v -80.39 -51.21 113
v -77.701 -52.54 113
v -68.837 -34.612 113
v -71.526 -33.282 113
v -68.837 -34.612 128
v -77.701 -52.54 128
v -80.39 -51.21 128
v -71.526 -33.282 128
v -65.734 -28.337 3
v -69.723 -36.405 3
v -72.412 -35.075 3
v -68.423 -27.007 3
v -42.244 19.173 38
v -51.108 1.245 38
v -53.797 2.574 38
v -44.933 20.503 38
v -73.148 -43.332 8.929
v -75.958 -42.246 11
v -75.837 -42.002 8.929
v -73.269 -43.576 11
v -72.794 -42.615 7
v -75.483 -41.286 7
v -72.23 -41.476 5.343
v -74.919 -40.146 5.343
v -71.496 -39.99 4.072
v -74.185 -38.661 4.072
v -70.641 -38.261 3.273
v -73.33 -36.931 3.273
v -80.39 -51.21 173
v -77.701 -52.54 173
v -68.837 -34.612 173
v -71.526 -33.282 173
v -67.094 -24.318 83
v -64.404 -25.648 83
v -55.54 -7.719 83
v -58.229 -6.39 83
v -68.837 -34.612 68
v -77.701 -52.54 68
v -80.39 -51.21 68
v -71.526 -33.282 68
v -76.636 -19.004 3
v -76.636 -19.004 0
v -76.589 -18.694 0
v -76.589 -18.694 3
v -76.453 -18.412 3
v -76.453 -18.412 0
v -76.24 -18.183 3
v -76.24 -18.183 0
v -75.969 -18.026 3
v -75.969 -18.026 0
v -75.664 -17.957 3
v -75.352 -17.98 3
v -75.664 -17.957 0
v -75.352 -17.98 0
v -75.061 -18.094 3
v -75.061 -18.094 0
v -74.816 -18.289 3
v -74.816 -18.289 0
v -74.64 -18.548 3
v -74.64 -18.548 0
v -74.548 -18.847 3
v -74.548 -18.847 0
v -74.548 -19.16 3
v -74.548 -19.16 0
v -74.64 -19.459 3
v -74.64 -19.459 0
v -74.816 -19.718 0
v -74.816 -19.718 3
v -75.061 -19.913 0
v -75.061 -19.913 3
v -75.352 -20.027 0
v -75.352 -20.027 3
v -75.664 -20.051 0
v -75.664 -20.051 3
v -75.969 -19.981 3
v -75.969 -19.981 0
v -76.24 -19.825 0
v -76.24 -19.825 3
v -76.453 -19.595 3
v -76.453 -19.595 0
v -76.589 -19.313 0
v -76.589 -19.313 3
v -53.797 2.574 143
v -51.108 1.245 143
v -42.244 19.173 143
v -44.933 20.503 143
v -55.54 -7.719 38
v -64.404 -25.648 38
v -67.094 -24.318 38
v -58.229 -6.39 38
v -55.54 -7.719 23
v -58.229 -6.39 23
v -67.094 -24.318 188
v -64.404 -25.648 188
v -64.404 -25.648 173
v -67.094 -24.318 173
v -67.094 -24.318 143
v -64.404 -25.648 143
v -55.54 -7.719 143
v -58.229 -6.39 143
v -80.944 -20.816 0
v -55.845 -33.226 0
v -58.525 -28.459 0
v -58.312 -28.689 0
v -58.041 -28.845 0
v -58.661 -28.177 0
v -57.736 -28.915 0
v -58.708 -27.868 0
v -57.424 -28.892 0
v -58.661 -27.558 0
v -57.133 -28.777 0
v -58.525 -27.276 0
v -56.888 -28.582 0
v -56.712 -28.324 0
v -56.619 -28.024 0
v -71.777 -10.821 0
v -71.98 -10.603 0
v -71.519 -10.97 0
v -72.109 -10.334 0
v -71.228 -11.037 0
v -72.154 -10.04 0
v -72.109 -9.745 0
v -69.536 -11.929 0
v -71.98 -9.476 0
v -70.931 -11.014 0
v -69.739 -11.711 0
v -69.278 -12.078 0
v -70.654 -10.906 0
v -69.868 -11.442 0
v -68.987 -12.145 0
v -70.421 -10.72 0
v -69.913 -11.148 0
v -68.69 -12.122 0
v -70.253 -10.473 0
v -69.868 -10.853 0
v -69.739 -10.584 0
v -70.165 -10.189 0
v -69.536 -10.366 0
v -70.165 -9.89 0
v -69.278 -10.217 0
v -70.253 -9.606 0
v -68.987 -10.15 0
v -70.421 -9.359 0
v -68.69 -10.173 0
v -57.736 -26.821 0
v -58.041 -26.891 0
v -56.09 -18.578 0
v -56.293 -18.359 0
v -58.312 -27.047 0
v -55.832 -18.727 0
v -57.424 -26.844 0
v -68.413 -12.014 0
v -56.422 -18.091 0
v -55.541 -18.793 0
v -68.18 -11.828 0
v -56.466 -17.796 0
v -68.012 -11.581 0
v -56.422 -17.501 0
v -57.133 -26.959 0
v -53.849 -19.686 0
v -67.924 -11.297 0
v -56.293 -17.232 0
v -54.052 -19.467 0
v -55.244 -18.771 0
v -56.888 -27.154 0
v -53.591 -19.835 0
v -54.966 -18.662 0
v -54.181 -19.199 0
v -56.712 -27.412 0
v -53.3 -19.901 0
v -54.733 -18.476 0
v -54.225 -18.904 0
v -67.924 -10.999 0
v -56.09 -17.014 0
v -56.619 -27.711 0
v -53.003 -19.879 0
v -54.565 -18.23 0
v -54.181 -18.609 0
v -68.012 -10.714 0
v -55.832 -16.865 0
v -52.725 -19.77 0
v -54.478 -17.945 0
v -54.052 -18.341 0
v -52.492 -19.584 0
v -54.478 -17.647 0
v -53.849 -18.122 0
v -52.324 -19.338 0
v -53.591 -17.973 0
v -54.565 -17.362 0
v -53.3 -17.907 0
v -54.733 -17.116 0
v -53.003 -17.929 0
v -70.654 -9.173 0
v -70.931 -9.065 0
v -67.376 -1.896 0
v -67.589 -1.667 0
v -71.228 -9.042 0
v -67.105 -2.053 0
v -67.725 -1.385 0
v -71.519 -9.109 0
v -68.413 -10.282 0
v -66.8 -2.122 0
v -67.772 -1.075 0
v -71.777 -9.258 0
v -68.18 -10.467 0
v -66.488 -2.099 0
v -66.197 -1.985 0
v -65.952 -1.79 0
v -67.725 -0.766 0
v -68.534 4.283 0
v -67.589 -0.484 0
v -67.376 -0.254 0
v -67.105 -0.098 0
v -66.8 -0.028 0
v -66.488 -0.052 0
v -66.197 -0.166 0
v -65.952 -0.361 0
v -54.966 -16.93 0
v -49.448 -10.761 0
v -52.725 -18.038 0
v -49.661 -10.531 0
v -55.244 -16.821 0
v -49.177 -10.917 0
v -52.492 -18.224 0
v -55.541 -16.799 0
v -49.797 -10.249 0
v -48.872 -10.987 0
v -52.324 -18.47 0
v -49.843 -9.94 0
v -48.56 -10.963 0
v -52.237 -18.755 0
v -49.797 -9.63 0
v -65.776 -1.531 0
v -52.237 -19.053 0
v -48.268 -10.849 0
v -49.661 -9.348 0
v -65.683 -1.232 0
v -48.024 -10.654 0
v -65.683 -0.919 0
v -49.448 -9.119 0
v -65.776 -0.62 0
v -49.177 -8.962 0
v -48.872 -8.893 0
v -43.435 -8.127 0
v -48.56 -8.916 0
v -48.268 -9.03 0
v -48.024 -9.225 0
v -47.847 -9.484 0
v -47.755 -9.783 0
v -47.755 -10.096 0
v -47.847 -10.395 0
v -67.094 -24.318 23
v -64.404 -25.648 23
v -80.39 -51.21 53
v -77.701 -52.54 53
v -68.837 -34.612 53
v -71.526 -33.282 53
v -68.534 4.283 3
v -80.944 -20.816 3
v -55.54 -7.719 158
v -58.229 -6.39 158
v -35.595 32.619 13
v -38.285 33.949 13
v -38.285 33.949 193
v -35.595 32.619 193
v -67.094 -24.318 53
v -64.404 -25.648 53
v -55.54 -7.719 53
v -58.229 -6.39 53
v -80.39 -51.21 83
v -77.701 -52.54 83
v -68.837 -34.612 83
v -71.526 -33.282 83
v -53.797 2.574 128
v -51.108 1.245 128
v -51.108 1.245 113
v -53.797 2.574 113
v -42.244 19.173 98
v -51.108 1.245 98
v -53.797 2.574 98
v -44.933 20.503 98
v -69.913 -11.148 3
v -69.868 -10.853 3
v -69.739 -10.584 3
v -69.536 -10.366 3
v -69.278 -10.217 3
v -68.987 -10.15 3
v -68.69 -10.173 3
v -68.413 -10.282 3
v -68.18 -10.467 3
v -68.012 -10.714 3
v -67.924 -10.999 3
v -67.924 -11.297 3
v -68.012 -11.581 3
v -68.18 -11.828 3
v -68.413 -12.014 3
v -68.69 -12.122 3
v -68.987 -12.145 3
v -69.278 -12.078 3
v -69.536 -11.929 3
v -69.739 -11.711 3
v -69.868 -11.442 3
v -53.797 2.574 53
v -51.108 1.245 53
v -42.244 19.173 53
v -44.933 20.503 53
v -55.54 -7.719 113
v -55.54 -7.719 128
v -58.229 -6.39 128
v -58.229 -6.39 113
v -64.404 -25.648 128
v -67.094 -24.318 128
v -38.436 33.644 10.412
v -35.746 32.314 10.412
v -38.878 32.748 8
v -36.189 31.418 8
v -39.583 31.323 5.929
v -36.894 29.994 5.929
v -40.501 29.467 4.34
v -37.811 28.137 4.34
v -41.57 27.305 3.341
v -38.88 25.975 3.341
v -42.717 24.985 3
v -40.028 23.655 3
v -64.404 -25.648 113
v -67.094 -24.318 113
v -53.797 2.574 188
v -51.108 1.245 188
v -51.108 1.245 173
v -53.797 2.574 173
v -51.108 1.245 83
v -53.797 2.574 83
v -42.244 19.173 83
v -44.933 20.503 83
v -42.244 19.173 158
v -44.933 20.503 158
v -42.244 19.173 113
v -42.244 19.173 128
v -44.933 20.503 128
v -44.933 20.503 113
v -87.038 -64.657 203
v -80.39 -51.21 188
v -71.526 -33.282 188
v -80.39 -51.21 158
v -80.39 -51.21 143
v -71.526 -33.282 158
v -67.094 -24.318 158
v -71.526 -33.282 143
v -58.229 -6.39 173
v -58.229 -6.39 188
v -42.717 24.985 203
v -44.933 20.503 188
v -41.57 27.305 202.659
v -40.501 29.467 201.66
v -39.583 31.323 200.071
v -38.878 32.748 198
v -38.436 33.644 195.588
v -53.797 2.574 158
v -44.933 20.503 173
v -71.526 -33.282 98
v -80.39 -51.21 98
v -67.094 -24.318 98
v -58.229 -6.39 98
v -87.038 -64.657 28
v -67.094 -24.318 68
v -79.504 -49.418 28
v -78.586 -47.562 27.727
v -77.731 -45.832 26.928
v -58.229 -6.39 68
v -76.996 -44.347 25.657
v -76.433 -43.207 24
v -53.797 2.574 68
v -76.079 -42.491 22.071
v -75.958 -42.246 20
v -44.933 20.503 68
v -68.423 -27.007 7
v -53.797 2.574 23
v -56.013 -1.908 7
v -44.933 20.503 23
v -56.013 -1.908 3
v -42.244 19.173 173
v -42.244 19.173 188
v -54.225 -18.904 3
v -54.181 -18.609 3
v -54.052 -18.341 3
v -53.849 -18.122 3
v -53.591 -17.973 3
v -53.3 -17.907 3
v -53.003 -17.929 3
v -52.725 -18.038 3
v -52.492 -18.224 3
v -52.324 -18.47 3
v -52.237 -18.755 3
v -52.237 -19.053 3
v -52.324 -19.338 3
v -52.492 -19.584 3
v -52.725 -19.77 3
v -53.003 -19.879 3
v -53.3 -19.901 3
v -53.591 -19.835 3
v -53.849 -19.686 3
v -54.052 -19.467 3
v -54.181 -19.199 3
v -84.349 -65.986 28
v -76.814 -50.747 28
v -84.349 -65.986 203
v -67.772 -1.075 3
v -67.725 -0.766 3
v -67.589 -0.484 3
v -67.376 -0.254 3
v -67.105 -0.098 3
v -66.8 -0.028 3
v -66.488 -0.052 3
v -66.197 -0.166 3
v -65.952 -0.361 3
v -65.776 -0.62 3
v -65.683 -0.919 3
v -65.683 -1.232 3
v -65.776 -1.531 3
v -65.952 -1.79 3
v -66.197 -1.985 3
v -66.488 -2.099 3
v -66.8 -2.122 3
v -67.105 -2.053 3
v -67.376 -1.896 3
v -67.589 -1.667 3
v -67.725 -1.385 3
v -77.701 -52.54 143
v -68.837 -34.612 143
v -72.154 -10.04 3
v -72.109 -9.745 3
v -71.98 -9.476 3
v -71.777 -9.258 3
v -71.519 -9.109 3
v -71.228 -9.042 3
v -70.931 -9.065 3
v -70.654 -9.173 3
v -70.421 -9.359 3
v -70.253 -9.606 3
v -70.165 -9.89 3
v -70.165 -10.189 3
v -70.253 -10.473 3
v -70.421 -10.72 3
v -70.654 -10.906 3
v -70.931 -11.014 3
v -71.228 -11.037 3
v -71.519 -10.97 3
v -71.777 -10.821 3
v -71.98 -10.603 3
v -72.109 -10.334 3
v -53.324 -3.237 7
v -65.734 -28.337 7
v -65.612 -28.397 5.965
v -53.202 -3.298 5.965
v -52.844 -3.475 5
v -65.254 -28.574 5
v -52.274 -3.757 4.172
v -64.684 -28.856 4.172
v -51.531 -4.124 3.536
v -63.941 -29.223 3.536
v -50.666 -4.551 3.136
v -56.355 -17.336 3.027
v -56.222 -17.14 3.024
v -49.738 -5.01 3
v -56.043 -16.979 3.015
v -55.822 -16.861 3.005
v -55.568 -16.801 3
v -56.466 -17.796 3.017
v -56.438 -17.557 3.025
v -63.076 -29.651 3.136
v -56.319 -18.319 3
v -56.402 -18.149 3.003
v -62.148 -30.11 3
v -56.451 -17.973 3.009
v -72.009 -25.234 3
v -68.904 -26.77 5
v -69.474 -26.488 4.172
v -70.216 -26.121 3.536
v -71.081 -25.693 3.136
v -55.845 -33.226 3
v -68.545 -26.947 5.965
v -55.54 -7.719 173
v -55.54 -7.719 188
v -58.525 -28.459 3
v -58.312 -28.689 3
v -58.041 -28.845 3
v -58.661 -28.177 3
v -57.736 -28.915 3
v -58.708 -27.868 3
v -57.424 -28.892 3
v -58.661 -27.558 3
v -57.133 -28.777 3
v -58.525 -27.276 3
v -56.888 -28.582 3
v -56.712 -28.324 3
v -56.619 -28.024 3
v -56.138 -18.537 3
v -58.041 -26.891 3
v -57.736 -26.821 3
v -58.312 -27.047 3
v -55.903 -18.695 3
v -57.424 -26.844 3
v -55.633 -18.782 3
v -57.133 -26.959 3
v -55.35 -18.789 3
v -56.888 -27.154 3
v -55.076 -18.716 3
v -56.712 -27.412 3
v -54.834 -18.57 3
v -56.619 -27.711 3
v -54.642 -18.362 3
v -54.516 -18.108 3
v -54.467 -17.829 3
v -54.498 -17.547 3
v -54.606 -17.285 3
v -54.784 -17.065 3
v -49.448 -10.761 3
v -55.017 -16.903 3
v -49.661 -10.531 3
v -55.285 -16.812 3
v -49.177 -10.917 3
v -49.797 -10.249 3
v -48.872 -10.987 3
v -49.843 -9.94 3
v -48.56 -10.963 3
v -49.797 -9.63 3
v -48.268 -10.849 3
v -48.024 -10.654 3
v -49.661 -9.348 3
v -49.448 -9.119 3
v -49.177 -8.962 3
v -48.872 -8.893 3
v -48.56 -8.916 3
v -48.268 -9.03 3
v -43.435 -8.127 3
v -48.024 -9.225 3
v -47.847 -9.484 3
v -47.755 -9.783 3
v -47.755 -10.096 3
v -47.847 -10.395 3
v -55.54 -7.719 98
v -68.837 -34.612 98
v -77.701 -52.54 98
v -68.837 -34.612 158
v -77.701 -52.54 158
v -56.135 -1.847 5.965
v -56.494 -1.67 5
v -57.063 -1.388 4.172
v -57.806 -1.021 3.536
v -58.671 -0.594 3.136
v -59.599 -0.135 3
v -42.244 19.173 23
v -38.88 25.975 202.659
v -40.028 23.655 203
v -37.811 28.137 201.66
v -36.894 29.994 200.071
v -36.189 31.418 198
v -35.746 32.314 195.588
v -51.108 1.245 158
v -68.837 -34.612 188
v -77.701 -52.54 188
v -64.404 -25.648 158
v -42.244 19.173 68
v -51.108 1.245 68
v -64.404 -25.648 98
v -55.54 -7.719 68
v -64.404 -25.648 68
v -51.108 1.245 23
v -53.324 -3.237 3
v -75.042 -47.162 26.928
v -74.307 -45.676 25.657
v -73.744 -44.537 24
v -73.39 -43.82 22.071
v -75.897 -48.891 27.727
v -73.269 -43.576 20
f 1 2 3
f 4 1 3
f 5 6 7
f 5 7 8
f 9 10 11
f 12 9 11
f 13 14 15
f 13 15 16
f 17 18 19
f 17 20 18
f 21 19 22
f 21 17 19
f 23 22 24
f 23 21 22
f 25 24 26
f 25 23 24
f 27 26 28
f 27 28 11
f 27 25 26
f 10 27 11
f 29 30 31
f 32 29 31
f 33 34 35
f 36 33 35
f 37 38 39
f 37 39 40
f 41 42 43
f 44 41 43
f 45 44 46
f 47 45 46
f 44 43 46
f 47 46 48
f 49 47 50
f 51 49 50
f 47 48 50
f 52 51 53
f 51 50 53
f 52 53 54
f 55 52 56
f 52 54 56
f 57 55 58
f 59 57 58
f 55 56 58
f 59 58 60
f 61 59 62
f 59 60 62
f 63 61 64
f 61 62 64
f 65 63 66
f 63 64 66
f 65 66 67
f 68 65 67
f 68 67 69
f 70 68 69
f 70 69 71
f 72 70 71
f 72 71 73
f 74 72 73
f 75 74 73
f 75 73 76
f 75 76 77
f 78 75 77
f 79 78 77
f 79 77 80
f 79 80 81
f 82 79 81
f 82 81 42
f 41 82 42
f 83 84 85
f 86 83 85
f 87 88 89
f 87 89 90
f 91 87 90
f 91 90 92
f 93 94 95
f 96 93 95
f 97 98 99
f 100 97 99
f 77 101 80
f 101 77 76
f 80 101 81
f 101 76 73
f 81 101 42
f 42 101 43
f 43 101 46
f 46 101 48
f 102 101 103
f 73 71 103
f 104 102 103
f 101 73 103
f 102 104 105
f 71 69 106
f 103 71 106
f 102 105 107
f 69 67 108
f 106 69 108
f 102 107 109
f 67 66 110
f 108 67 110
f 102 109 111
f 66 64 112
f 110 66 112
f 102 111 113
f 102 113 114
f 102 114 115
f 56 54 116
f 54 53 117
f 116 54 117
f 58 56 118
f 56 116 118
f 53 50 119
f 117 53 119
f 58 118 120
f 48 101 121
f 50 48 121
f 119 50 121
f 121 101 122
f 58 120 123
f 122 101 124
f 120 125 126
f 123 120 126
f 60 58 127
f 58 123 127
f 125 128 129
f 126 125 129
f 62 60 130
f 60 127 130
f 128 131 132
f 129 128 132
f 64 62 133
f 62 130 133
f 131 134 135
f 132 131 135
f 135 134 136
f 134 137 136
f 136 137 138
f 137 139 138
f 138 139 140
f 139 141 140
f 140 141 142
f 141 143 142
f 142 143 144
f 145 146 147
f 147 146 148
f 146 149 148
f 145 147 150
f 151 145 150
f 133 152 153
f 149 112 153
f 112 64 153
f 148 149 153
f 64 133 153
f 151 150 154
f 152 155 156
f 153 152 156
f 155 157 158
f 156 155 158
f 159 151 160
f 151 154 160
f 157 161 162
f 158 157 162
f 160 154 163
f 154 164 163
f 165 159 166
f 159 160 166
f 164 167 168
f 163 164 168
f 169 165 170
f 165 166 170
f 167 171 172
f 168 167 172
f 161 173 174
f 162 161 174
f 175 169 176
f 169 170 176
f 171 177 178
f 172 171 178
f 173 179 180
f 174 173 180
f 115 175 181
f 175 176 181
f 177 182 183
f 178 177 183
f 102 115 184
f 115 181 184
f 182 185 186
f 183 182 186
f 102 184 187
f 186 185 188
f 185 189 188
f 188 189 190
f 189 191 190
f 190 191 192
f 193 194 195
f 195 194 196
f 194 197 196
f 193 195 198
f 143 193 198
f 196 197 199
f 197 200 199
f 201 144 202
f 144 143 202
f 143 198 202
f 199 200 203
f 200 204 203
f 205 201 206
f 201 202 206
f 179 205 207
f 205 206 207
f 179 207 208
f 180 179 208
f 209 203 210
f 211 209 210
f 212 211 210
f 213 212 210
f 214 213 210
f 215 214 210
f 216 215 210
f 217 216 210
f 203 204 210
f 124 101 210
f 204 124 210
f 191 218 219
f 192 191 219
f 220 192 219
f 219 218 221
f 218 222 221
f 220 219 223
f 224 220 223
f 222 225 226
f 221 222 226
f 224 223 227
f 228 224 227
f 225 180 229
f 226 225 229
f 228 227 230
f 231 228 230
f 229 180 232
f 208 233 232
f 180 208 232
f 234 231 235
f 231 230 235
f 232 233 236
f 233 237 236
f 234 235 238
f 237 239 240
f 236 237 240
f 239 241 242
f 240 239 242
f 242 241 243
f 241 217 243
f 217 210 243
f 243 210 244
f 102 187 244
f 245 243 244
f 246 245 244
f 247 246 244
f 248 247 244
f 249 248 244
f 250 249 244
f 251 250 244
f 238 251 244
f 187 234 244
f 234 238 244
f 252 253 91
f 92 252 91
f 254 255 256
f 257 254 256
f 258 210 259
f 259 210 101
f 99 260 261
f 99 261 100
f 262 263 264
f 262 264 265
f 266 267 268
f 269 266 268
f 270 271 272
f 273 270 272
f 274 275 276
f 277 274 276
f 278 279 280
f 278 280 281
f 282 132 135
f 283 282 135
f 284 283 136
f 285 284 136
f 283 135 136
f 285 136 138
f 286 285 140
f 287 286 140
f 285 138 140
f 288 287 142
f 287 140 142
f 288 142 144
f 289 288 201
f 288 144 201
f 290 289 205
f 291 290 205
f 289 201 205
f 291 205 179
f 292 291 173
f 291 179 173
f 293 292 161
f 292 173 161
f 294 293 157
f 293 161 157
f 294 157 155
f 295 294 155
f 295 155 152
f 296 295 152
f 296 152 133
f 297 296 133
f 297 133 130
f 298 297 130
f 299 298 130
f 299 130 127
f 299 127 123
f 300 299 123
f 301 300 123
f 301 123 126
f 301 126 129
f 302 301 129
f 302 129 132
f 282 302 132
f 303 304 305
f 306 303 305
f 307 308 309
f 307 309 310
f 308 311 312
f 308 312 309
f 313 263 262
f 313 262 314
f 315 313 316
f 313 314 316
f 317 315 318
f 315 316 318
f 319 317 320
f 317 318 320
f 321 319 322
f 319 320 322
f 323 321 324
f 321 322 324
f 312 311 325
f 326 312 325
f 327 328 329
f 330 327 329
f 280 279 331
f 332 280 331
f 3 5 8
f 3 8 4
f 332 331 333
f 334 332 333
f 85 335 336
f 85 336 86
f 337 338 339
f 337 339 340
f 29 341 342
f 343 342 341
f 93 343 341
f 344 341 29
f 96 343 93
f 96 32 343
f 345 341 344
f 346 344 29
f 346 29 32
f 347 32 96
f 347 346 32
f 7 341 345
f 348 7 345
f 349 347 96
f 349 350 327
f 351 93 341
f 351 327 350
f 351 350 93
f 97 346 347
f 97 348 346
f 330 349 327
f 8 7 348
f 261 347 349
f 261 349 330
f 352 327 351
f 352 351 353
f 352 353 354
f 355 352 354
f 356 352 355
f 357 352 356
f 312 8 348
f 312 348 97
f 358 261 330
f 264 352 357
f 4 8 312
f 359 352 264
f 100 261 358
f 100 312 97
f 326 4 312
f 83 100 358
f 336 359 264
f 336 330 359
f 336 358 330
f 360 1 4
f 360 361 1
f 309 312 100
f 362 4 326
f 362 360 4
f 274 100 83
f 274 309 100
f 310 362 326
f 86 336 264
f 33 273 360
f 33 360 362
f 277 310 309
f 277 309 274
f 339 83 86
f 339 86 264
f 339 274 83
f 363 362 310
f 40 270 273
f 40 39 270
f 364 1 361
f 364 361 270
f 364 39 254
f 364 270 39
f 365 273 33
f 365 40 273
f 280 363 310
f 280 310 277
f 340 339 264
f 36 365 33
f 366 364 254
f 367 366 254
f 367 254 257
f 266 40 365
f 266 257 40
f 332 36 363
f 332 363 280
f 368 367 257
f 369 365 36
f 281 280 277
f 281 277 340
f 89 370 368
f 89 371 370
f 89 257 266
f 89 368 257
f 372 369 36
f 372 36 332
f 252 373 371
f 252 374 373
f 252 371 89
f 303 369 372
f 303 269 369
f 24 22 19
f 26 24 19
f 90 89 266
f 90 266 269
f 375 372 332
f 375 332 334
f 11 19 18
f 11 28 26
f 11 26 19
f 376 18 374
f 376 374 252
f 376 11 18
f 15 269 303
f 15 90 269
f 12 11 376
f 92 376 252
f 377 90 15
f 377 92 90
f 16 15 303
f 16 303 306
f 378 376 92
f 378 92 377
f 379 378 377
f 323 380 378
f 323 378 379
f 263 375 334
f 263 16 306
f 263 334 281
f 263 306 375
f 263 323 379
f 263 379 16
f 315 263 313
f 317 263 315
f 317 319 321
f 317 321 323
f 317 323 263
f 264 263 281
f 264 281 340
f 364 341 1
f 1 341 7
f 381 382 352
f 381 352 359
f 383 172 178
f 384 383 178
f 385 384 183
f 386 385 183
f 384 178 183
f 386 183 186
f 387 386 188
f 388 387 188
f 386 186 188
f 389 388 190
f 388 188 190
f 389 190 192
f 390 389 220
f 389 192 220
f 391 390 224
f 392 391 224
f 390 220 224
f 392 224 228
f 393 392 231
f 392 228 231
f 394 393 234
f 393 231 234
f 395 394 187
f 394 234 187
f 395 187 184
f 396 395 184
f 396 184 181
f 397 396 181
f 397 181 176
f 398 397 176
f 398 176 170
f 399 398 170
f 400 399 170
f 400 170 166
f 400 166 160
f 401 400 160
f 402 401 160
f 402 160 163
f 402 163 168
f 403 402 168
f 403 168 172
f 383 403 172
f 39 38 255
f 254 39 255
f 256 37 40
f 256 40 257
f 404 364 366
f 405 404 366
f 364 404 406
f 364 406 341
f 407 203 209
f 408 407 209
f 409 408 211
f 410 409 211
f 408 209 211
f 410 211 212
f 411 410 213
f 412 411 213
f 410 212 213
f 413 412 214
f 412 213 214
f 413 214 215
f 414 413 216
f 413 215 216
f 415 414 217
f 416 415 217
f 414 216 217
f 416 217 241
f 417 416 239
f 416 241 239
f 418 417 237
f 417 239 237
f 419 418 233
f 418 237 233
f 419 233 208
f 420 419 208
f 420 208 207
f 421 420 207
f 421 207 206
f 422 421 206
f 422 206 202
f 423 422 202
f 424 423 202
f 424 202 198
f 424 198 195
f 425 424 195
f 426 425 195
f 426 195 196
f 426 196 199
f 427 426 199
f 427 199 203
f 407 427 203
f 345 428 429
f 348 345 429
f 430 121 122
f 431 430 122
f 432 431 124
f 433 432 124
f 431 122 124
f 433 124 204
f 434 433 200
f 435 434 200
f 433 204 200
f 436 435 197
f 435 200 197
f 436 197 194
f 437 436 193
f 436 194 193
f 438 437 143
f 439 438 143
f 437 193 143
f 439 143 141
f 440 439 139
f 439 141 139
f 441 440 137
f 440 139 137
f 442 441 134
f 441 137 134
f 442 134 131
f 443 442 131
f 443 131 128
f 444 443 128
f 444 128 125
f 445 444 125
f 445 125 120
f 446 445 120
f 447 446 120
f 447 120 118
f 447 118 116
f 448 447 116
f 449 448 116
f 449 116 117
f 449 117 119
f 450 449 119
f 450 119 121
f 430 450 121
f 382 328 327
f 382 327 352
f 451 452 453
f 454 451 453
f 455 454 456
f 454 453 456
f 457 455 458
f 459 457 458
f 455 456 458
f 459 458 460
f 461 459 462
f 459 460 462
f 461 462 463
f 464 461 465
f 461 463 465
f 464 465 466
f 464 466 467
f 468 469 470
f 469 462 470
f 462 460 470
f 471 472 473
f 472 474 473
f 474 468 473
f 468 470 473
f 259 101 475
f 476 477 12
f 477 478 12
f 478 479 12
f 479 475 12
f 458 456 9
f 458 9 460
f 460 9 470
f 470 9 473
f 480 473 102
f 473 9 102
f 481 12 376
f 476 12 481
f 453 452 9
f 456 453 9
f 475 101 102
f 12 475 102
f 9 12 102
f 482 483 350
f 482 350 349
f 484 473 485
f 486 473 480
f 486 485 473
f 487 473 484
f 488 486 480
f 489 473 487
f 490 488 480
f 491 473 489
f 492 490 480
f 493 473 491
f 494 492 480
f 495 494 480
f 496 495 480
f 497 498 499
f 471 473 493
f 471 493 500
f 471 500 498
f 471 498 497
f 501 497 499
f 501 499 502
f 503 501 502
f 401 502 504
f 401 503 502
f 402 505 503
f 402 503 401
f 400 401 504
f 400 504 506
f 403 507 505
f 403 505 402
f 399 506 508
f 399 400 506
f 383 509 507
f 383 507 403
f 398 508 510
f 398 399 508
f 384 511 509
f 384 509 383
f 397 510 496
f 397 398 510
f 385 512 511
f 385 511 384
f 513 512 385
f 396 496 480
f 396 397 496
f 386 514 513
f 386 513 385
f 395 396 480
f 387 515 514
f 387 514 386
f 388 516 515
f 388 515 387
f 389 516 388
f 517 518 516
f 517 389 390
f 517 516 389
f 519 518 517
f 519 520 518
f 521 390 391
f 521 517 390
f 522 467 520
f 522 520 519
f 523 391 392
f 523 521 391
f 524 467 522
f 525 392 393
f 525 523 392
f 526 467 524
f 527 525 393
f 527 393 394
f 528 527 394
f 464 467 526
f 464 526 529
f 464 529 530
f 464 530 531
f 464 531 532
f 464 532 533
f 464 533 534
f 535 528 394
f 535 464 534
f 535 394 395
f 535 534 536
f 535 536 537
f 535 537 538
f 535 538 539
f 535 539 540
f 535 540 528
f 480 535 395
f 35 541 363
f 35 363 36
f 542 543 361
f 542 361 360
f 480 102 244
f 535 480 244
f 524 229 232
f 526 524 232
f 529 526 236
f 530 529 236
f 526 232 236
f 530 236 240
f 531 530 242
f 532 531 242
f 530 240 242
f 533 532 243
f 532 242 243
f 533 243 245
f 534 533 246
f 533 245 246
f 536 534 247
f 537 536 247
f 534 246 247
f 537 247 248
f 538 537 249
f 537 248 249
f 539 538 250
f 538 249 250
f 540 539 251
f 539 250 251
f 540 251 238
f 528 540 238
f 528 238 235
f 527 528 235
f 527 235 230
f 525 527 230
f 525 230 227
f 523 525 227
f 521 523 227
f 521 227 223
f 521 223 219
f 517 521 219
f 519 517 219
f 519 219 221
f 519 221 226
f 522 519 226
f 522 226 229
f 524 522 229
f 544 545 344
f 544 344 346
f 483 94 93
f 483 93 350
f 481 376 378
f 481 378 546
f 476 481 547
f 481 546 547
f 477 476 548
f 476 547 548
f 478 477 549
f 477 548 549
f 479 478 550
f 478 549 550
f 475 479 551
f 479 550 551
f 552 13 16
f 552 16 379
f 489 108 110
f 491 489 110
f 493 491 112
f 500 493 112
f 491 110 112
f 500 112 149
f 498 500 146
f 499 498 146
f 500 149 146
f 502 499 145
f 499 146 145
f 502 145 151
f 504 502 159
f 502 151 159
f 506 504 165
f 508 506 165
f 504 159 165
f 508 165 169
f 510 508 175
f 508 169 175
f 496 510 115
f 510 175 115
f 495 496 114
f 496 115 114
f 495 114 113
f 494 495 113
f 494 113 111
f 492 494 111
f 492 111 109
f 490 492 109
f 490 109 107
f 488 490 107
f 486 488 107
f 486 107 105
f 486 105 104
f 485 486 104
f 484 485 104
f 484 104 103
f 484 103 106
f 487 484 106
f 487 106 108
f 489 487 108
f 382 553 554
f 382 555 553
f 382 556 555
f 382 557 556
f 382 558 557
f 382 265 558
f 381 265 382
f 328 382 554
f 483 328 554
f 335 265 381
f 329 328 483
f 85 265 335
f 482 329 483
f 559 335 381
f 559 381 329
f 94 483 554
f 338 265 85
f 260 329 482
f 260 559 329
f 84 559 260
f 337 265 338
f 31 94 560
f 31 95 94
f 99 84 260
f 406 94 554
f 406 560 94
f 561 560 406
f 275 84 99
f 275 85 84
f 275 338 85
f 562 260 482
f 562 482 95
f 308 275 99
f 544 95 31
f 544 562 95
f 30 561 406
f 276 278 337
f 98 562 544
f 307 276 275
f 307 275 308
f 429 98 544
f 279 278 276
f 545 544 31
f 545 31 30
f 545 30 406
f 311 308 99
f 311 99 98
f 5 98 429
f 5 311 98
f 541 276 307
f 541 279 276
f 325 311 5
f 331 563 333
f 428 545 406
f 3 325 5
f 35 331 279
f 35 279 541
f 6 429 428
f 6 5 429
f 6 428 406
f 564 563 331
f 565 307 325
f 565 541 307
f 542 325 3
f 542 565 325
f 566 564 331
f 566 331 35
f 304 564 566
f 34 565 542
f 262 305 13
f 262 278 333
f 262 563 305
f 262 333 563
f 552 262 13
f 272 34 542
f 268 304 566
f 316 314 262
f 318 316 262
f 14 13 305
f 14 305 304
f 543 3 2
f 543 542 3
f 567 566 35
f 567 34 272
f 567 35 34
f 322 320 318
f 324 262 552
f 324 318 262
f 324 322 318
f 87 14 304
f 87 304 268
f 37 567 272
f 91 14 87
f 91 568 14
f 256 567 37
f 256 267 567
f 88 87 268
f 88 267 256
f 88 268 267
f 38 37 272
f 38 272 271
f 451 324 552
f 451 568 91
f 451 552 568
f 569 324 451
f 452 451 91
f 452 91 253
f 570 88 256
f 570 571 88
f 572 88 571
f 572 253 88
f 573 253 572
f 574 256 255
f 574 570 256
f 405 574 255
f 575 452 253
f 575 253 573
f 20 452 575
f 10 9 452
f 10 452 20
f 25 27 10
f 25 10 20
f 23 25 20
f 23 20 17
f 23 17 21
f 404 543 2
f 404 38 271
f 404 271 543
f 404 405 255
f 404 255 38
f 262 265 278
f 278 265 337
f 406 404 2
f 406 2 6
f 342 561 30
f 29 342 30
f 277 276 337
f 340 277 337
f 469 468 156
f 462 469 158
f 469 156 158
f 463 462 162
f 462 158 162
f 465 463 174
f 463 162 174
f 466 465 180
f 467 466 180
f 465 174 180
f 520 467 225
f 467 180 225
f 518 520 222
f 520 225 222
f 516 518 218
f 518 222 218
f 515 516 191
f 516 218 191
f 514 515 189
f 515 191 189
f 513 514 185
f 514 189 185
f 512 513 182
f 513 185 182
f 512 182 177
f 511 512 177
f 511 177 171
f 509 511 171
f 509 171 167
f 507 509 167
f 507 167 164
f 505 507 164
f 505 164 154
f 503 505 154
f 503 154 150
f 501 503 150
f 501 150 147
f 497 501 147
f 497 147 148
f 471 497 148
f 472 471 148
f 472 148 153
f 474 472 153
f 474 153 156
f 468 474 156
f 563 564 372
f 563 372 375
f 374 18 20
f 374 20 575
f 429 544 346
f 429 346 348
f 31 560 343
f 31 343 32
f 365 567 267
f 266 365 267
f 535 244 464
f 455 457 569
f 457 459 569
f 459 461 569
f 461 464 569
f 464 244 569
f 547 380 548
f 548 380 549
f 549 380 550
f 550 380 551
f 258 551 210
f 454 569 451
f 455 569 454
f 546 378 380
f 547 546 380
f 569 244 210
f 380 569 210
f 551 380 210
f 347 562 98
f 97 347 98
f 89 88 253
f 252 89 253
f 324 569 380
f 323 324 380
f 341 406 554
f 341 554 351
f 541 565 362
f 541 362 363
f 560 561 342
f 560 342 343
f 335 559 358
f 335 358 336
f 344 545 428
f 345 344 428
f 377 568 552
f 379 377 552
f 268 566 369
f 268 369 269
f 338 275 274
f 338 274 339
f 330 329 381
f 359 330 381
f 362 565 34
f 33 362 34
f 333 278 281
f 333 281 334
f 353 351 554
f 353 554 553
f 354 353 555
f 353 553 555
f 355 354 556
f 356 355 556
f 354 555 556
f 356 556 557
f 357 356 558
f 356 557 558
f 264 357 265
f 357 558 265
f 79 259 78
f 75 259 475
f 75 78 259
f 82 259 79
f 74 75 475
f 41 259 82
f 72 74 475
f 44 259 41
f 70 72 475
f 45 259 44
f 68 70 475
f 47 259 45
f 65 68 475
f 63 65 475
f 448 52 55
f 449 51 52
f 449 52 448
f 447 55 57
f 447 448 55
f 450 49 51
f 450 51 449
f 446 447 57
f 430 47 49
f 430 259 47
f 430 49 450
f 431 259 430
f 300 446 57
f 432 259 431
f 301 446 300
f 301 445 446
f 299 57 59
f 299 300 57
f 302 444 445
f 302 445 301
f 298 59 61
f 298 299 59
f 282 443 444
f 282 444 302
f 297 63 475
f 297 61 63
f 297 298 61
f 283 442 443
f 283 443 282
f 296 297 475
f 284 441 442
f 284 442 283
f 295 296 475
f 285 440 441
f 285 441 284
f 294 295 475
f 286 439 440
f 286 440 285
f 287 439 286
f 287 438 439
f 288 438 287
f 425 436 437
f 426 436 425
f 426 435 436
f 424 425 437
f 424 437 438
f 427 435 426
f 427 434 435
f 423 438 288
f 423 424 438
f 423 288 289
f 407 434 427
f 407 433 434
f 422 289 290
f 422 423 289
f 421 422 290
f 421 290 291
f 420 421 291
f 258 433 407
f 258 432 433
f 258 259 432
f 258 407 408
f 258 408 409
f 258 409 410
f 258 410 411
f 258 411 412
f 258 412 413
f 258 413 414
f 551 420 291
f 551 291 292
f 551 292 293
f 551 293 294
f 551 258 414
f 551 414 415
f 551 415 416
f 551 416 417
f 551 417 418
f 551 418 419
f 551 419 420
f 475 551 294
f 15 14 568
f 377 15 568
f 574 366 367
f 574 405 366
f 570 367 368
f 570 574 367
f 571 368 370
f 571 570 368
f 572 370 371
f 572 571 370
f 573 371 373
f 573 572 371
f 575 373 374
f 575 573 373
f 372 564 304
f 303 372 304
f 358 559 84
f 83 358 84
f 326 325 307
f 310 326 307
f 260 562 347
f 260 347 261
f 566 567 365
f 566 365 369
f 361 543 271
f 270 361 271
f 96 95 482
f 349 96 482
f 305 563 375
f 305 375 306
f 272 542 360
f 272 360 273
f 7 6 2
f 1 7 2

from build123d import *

# Parameters (mm, degrees)
EXTRUDE_1_DEPTH     = 3
EXTRUDE_2_DEPTH     = 200
FILLET_1_R          = 4
SKETCH_4_W          = 25
SKETCH_4_H          = 25
CUT_EXTRUDE_1_DEPTH = 4
FILLET_3_R          = 8
SKETCH_5_W          = 15
SKETCH_5_H          = 20
CUT_EXTRUDE_2_DEPTH = 10
FILLET_4_R          = 10
FILLET_5_R          = 10
SKETCH_7_R          = 1.05
SKETCH_7_R_2        = 1
CUT_EXTRUDE_3_DEPTH = 5


with BuildPart() as part:
    # 草图1 → 凸台-拉伸1 (new body)
    with BuildSketch(Plane.XY):
        Polygon((-68.534318099, 4.283164377), (-80.94435421, -20.816457208), (-55.844732625, -33.22649332), (-43.434696514, -8.126871734), align=None)
    extrude(amount=EXTRUDE_1_DEPTH)

    # 草图2 → 凸台-拉伸2 (add)
    with BuildSketch(Plane.XY.offset(3)):
        Polygon((-87.038364402, -64.656684429), (-38.284651107, 33.948971798), (-35.595405937, 32.619325071), (-84.349119232, -65.986331156), align=None)
    extrude(amount=EXTRUDE_2_DEPTH)

    # 圆角1
    fillet_1_edges = [part.edges().sort_by_distance(p)[0] for p in [
        (-59.529047009, -15.787087985, 3),
        (-62.218292179, -14.457441259, 3),
    ]]
    fillet(fillet_1_edges, radius=FILLET_1_R)

    # 草图4 → 切除-拉伸1 (cut)
    with BuildSketch(Plane(origin=(-44.25211262, 21.879625307, 0), x_dir=(0, 0, 1), z_dir=(-0.8964150566080468, 0.4432155754104229, 0))):
        with Locations((15.5, -84.035984194)):
            Rectangle(SKETCH_4_W, SKETCH_4_H)
    extrude(amount=-CUT_EXTRUDE_1_DEPTH, mode=Mode.SUBTRACT)

    # 圆角3
    fillet_3_edges = [part.edges().sort_by_distance(p)[0] for p in [
        (-74.613352432, -42.911131377, 3),
        (-74.613352432, -42.911131377, 28),
    ]]
    fillet(fillet_3_edges, radius=FILLET_3_R)

    # 草图5 → 切除-拉伸2 (cut)
    with BuildSketch(Plane(origin=(-41.56286745, 20.54997858, 0), x_dir=(0, 0, -1), z_dir=(0.8964150566080469, -0.4432155754104229, 0))):
        with Locations((-60.5, -11.535984194)):
            Rectangle(SKETCH_5_W, SKETCH_5_H)
        with Locations((-30.5, -11.535984194)):
            Rectangle(SKETCH_5_W, SKETCH_5_H)
        with Locations((-90.5, -11.535984194)):
            Rectangle(SKETCH_5_W, SKETCH_5_H)
        with Locations((-120.5, -11.535984194)):
            Rectangle(SKETCH_5_W, SKETCH_5_H)
        with Locations((-150.5, -11.535984194)):
            Rectangle(SKETCH_5_W, SKETCH_5_H)
        with Locations((-180.5, -11.535984194)):
            Rectangle(SKETCH_5_W, SKETCH_5_H)
        with Locations((-60.5, -41.535984194)):
            Rectangle(SKETCH_5_W, SKETCH_5_H)
        with Locations((-90.5, -41.535984194)):
            Rectangle(SKETCH_5_W, SKETCH_5_H)
        with Locations((-120.5, -41.535984194)):
            Rectangle(SKETCH_5_W, SKETCH_5_H)
        with Locations((-150.5, -41.535984194)):
            Rectangle(SKETCH_5_W, SKETCH_5_H)
        with Locations((-180.5, -41.535984194)):
            Rectangle(SKETCH_5_W, SKETCH_5_H)
        with Locations((-60.5, -71.535984194)):
            Rectangle(SKETCH_5_W, SKETCH_5_H)
        with Locations((-90.5, -71.535984194)):
            Rectangle(SKETCH_5_W, SKETCH_5_H)
        with Locations((-120.5, -71.535984194)):
            Rectangle(SKETCH_5_W, SKETCH_5_H)
        with Locations((-150.5, -71.535984194)):
            Rectangle(SKETCH_5_W, SKETCH_5_H)
        with Locations((-180.5, -71.535984194)):
            Rectangle(SKETCH_5_W, SKETCH_5_H)
        with Locations((-30.5, -41.535984194)):
            Rectangle(SKETCH_5_W, SKETCH_5_H)
    extrude(amount=-CUT_EXTRUDE_2_DEPTH, mode=Mode.SUBTRACT)

    # 圆角4
    fillet_4_edges = [part.edges().sort_by_distance(p)[0] for p in [
        (-36.940028522, 33.284148434, 203),
    ]]
    fillet(fillet_4_edges, radius=FILLET_4_R)

    # 圆角5
    fillet_5_edges = [part.edges().sort_by_distance(p)[0] for p in [
        (-36.940028522, 33.284148434, 3),
    ]]
    fillet(fillet_5_edges, radius=FILLET_5_R)

    # 草图7 → 切除-拉伸3 (cut)
    with BuildSketch(Plane(origin=(0, 0, 0), x_dir=(-1, 0, 0), z_dir=(0, 0, -1))):
        with Locations((48.793219042, -9.939669659)):
            Circle(SKETCH_7_R)
        with Locations((66.721520174, -1.075358151)):
            Circle(SKETCH_7_R)
        with Locations((71.153675928, -10.039508717)):
            Circle(SKETCH_7_R_2)
        with Locations((68.912638286, -11.147547656)):
            Circle(SKETCH_7_R_2)
        with Locations((75.585831682, -19.003659283)):
            Circle(SKETCH_7_R)
        with Locations((57.65753055, -27.867970791)):
            Circle(SKETCH_7_R)
        with Locations((53.225374796, -18.903820225)):
            Circle(SKETCH_7_R_2)
        with Locations((55.466412437, -17.795781287)):
            Circle(SKETCH_7_R_2)
    extrude(amount=-CUT_EXTRUDE_3_DEPTH, mode=Mode.SUBTRACT)


solid = part.part
